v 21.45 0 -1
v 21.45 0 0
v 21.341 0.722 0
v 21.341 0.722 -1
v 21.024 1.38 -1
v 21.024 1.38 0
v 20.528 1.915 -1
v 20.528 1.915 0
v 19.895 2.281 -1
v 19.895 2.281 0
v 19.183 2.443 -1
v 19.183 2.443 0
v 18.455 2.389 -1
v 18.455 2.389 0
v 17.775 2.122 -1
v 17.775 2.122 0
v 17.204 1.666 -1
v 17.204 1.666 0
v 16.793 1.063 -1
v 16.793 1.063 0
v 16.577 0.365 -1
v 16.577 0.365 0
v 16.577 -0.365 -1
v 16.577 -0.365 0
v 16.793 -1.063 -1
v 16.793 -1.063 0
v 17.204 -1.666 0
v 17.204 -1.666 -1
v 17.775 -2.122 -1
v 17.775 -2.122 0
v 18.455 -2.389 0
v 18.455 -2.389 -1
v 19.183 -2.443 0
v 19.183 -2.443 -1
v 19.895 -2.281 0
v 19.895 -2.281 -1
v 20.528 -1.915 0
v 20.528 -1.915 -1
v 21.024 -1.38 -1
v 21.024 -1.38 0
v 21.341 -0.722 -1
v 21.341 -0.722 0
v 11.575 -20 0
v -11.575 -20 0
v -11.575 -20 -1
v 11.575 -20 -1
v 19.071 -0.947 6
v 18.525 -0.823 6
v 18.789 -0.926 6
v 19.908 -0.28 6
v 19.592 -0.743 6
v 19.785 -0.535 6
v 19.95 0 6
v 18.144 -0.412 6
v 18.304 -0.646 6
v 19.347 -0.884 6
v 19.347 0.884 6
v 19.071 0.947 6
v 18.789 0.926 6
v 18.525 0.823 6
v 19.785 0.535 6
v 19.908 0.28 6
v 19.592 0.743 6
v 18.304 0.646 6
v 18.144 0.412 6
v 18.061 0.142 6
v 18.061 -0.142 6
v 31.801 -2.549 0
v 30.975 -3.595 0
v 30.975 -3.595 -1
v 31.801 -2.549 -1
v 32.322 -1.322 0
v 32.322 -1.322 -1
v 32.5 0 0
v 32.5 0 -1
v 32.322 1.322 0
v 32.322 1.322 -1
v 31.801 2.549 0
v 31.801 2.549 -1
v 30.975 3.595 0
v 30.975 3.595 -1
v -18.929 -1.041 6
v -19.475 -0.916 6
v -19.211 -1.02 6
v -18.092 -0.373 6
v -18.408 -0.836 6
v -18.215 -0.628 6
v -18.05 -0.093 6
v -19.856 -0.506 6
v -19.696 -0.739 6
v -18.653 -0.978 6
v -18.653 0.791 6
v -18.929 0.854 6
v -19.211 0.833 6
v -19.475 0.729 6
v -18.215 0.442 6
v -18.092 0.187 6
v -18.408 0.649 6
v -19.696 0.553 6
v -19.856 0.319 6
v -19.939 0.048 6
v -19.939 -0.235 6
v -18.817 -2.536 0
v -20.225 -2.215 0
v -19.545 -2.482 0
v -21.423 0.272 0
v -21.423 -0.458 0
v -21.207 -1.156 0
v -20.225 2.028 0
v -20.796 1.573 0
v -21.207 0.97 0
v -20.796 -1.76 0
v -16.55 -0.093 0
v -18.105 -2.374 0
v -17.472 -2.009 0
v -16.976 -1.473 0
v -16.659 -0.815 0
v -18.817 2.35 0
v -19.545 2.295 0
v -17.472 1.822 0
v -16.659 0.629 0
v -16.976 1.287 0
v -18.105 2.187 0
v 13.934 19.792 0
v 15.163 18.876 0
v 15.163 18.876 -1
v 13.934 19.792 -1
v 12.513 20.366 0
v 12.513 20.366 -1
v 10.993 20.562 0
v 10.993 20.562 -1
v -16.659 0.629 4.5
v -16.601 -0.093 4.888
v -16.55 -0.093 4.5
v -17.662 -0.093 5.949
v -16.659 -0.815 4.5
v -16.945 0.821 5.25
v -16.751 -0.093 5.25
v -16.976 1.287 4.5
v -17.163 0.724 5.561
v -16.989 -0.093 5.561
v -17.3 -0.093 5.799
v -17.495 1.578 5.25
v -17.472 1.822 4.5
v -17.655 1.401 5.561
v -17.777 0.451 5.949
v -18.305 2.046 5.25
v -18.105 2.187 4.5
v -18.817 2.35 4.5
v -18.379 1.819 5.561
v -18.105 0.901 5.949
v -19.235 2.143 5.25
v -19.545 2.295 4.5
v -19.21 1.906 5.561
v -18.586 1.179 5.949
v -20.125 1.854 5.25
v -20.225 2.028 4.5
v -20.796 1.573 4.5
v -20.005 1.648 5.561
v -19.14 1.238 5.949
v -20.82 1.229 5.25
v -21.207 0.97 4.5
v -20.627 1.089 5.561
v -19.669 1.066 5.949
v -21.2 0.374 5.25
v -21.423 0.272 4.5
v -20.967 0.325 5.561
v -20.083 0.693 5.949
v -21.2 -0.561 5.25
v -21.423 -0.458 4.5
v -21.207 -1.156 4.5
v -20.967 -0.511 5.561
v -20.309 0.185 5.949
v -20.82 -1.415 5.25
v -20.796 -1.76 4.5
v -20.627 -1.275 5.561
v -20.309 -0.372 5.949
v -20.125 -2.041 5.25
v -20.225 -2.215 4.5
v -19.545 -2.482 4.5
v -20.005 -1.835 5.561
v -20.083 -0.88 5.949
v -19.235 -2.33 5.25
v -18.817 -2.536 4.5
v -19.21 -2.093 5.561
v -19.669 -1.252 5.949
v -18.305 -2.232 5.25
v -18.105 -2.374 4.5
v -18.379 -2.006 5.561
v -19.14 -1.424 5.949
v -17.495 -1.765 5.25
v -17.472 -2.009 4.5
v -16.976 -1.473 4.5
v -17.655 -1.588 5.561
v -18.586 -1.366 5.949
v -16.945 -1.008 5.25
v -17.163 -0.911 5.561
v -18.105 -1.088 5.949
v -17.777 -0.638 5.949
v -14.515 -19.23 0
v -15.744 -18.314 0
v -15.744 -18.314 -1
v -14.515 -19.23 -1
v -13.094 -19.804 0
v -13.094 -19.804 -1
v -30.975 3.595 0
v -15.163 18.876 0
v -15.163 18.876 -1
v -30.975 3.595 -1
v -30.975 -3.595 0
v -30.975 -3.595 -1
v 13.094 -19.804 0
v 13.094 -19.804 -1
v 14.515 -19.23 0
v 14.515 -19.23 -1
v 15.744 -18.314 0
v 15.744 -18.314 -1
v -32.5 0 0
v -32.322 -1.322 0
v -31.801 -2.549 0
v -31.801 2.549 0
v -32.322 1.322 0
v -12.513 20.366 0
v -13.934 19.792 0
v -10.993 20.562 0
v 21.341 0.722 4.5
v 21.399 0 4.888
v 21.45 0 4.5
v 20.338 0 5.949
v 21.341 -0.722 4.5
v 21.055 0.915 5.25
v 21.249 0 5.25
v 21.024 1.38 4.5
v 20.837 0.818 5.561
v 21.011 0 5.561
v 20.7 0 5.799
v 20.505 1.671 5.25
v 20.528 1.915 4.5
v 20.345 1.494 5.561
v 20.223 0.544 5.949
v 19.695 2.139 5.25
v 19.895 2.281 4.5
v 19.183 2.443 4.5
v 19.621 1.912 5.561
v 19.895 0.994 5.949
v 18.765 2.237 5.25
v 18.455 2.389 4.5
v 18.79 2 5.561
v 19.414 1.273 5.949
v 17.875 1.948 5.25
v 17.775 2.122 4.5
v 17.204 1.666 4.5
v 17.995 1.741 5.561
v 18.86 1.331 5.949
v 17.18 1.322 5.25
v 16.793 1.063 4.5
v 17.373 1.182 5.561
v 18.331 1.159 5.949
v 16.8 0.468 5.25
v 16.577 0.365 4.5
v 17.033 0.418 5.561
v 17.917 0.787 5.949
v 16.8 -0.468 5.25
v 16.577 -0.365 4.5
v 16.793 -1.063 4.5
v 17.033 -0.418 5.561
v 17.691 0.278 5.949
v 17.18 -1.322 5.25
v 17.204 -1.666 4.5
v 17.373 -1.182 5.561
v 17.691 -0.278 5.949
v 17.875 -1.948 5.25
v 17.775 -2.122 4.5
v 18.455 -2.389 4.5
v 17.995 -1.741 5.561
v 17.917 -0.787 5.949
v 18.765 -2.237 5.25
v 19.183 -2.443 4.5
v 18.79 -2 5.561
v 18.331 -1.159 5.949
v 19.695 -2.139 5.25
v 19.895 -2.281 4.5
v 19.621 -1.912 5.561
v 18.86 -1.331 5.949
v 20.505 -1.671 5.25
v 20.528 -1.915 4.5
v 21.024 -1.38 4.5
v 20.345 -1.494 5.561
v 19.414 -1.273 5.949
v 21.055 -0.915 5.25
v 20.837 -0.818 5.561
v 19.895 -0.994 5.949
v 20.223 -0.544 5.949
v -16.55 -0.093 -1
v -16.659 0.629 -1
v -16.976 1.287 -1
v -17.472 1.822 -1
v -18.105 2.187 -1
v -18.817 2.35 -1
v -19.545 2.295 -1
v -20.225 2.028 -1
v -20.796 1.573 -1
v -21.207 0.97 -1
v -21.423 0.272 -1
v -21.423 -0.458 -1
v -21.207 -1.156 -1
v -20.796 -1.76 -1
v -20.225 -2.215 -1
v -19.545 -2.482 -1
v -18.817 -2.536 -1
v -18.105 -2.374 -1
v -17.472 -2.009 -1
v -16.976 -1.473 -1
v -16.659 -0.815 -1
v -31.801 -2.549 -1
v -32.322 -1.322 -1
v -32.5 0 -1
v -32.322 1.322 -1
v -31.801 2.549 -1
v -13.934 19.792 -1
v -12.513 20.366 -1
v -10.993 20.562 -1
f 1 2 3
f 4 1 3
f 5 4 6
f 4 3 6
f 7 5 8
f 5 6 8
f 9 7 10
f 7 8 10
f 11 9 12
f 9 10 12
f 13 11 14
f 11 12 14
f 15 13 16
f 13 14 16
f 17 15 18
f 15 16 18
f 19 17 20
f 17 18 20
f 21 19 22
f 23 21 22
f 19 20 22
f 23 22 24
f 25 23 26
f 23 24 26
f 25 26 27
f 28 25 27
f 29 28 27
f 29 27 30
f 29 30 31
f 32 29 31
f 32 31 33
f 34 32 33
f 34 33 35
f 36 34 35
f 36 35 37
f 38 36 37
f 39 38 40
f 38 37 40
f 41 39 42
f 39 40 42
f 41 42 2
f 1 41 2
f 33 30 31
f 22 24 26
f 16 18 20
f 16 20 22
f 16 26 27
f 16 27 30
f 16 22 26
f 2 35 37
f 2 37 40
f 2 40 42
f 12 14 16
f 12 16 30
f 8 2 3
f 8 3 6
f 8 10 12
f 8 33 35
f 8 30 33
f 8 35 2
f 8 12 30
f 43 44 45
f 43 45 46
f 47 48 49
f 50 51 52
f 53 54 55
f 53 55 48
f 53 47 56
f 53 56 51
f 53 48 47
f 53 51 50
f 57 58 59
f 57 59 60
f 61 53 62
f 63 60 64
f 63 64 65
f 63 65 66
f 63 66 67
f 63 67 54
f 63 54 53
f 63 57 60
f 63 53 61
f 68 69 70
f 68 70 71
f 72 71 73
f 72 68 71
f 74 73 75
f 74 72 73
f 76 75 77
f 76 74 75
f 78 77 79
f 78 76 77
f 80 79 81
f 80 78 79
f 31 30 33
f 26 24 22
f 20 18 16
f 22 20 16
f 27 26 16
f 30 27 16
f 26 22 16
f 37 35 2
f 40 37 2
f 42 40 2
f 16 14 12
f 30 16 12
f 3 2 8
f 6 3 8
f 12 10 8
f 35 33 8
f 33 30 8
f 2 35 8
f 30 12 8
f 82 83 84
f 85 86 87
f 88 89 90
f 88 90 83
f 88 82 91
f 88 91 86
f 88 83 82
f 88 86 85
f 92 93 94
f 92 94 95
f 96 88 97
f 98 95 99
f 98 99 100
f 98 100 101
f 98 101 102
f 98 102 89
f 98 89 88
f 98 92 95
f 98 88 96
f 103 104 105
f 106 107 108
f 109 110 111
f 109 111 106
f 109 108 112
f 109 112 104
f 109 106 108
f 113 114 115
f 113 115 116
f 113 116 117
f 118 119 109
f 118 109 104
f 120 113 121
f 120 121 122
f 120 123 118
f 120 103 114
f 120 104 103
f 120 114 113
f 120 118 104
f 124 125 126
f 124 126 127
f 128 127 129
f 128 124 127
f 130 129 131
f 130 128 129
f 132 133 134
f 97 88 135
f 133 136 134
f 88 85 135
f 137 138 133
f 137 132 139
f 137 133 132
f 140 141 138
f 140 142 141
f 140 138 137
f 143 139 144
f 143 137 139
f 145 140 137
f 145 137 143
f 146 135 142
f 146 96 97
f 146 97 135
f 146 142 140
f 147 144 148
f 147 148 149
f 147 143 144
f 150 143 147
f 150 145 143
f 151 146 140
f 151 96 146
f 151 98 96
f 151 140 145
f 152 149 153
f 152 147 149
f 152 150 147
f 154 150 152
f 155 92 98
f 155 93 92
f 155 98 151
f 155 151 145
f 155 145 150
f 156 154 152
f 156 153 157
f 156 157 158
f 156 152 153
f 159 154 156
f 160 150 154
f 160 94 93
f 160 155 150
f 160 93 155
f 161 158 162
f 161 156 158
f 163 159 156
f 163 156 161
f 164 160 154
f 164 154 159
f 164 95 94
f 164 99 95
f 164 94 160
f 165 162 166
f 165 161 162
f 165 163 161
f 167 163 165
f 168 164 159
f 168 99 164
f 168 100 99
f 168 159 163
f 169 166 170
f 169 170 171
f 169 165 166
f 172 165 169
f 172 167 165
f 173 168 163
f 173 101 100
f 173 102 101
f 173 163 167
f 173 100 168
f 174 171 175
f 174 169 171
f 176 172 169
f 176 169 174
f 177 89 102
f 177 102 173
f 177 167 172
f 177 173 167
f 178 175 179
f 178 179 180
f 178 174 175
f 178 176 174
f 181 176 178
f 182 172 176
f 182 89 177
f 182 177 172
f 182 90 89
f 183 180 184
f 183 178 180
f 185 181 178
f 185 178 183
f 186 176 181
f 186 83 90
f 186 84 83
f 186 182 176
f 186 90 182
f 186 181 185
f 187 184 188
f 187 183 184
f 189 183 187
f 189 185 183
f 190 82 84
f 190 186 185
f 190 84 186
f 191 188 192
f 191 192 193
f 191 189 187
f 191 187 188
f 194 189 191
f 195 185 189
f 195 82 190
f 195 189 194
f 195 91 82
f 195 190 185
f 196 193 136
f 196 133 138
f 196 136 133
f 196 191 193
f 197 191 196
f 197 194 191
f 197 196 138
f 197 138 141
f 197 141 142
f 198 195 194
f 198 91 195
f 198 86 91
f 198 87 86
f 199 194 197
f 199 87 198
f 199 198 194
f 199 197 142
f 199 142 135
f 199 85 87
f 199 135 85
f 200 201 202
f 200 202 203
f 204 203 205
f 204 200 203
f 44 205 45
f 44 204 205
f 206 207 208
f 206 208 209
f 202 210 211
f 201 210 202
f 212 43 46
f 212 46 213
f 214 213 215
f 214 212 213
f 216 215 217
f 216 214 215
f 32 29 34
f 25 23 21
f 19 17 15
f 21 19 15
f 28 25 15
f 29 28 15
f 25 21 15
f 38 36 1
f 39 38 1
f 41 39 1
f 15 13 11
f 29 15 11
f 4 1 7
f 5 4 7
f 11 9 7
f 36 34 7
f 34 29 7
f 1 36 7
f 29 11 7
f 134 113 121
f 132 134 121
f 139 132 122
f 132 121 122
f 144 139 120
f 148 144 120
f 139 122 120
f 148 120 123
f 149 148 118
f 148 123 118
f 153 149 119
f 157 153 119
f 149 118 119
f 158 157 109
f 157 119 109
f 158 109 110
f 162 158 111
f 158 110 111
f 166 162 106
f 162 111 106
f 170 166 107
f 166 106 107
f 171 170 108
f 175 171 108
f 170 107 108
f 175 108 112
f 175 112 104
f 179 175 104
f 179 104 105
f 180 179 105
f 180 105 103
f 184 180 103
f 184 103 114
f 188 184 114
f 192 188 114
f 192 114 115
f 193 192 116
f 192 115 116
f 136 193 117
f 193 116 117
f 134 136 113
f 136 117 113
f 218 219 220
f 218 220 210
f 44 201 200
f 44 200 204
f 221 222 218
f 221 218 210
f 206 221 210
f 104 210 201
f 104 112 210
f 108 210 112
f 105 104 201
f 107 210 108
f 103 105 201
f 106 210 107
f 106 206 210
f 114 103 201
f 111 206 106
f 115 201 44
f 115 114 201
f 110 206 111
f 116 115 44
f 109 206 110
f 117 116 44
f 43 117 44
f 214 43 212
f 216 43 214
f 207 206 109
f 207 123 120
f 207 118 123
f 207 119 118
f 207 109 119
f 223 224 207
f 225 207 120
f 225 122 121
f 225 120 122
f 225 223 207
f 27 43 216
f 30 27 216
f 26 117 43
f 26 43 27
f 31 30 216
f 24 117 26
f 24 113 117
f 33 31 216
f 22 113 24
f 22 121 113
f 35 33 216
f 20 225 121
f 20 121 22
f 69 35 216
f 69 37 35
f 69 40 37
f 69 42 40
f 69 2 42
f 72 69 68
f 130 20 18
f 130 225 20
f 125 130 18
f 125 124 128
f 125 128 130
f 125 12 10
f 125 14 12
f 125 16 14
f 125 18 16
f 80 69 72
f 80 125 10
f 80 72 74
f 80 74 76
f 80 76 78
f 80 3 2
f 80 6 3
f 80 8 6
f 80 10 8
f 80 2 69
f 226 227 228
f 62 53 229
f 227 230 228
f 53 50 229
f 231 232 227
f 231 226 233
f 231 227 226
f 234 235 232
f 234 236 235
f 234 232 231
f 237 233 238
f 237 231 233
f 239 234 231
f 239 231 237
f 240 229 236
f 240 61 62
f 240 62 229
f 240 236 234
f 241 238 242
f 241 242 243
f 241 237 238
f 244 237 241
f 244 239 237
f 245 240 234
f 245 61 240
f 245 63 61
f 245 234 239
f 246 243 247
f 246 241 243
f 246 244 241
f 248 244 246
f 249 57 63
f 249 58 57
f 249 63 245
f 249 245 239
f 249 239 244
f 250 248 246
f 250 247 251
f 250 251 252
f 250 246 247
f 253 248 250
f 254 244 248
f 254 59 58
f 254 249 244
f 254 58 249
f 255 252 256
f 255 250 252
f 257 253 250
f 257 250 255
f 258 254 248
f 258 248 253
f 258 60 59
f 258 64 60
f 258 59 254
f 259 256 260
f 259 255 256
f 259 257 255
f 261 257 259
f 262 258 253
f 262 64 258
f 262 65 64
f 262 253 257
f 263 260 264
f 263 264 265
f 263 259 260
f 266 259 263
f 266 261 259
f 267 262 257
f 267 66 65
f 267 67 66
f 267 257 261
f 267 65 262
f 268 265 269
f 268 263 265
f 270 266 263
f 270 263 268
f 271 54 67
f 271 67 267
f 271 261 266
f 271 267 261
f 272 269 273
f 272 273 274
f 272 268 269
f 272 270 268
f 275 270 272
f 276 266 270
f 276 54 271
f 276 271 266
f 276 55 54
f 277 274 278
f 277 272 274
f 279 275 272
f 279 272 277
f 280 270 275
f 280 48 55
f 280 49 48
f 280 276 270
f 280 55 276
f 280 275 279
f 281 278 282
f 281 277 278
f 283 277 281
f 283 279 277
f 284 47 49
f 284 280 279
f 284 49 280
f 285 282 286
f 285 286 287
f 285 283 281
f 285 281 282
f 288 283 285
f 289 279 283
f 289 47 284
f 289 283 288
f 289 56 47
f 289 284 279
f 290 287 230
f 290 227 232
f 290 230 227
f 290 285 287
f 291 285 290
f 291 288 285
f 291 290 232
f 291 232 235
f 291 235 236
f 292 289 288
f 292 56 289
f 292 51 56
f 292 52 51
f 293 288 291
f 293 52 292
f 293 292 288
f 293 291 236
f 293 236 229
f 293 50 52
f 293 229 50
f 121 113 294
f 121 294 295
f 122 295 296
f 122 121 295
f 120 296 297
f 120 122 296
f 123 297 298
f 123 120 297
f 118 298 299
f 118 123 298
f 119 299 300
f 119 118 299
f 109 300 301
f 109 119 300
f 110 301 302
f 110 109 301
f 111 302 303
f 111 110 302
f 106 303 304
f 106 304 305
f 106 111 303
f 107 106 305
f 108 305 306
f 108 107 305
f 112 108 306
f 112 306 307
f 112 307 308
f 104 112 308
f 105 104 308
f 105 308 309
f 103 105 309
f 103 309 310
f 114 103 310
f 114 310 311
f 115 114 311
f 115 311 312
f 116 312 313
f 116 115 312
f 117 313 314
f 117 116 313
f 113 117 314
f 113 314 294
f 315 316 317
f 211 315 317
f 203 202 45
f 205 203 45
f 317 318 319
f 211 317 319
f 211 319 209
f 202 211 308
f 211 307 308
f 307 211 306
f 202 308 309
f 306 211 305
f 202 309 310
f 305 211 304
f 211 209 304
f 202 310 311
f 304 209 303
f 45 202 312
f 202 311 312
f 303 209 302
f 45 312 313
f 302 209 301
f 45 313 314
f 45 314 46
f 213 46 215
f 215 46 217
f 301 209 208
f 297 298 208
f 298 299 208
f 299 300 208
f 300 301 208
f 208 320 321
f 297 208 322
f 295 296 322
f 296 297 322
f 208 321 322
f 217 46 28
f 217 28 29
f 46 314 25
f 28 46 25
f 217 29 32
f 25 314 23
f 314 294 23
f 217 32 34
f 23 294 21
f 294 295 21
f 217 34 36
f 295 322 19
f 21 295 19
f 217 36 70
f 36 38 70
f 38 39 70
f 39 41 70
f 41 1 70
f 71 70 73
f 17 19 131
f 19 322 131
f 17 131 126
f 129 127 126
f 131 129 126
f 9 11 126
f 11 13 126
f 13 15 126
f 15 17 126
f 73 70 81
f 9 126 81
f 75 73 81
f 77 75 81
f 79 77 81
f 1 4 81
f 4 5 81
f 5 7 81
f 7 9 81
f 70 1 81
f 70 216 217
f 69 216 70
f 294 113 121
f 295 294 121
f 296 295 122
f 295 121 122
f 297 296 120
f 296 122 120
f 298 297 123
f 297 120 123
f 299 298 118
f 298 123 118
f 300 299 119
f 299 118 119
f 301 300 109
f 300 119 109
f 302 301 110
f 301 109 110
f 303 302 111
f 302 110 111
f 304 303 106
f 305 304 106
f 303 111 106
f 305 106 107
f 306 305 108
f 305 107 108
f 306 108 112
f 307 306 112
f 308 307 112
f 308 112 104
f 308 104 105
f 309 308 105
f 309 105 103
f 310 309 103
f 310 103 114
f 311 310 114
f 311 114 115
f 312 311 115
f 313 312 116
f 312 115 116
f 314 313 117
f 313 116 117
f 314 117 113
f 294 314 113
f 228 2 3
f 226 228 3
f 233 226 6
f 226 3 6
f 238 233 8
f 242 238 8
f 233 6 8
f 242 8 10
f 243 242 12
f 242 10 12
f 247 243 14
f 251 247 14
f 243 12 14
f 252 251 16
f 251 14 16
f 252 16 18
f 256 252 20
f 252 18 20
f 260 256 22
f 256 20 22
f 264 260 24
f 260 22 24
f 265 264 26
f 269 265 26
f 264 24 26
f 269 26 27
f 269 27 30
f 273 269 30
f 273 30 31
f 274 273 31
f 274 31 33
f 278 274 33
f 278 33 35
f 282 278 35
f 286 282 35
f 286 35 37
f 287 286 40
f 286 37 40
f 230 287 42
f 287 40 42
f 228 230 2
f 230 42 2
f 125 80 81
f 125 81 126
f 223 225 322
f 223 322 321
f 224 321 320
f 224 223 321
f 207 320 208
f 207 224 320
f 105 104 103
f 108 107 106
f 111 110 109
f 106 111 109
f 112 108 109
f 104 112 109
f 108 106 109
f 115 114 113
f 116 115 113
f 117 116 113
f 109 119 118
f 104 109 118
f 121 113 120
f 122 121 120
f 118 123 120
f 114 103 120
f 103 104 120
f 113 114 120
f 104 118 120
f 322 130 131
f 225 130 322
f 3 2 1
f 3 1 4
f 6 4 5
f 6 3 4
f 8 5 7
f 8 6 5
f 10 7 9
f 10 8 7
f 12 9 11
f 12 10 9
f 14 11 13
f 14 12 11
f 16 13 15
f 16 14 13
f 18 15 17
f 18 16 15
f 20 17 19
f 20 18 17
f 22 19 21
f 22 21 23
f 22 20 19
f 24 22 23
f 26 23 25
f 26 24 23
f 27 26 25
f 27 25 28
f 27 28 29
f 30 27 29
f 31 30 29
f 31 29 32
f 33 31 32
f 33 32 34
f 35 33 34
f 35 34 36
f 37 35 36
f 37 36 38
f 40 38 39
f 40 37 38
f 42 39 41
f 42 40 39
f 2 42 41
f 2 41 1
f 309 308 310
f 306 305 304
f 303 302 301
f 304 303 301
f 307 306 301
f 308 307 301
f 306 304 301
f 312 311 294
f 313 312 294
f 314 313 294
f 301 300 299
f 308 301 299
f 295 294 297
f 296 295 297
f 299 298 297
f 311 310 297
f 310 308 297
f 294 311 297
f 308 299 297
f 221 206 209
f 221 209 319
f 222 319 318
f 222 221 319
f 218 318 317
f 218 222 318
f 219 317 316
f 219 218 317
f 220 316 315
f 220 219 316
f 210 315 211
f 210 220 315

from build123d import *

# Parameters (mm, degrees)
F0_R     = 2.45
F1_DEPTH = 1
F2_DEPTH = 6
F3_R     = 1.5
F4_R     = 1.5
F5_DEPTH = 1


# Not quite as in the source:
# - a feature names something its author has since deleted; it is built from what else it names


with BuildPart() as f1:
    # F0 (on Top) → F1 (new body)
    with BuildSketch(Plane.XY):
        with BuildLine():
            Line((10.9931575138, 20.5618447948), (0, 20.5618447948))
            Line((0, 20.5618447948), (0, -20))
            Line((0, -20), (11.5745256156, -20))
            ThreePointArc((11.5745256156, -20), (13.8232148234, -19.5626789272), (15.7441043055, -18.3144656157))
            Line((15.7441043055, -18.3144656157), (30.9746489082, -3.5953880131))
            ThreePointArc((30.9746489082, -3.5953880131), (32.5, 0), (30.9746489082, 3.5953880131))
            Line((30.9746489082, 3.5953880131), (15.1627362037, 18.8763104104))
            ThreePointArc((15.1627362037, 18.8763104104), (13.2418467215, 20.124523722), (10.9931575138, 20.5618447948))
        make_face()
        with Locations((19, 0)):
            Circle(F0_R, mode=Mode.SUBTRACT)
        with BuildLine():
            Line((0, 20.5618447948), (-10.9931575138, 20.5618447948))
            ThreePointArc((-10.9931575138, 20.5618447948), (-13.2418467215, 20.124523722), (-15.1627362037, 18.8763104104))
            Line((-15.1627362037, 18.8763104104), (-30.9746489082, 3.5953880131))
            ThreePointArc((-30.9746489082, 3.5953880131), (-32.5, 0), (-30.9746489082, -3.5953880131))
            Line((-30.9746489082, -3.5953880131), (-15.7441043055, -18.3144656157))
            ThreePointArc((-15.7441043055, -18.3144656157), (-13.8232148234, -19.5626789272), (-11.5745256156, -20))
            Line((-11.5745256156, -20), (0, -20))
            Line((0, -20), (0, 20.5618447948))
        make_face()
        with Locations((-19, -0.0933343646)):
            Circle(F0_R, mode=Mode.SUBTRACT)
    extrude(amount=-F1_DEPTH)


with BuildPart() as f2:
    # F0 (on Top) → F2 (new body)
    with BuildSketch(Plane.XY):
        with Locations((-19, -0.0933343646)):
            Circle(F0_R)
    extrude(amount=F2_DEPTH)

    # F3
    f3_edges = [f2.edges().sort_by_distance(p)[0] for p in [
        (-21.45, -0.093334, 6),
    ]]
    fillet(f3_edges, radius=F3_R)


with BuildPart() as f2b:
    # F0 (on Top) → F2, piece 2 (new body)
    with BuildSketch(Plane.XY):
        with Locations((19, 0)):
            Circle(F0_R)
    extrude(amount=F2_DEPTH)

    # F4
    f4_edges = [f2b.edges().sort_by_distance(p)[0] for p in [
        (16.55, 0, 6),
    ]]
    fillet(f4_edges, radius=F4_R)


with BuildPart() as f5:
    # F5 (new): a face of the model
    f5_faces = [f2b.part.faces().sort_by_distance(p)[0] for p in [
        (19, 0, 0),
    ]]
    extrude(f5_faces, amount=F5_DEPTH)


with BuildPart() as f5b:
    # F5#2 (new): a face of the model
    f5_2_faces = [f2.part.faces().sort_by_distance(p)[0] for p in [
        (-19, -0.0933343646, 0),
    ]]
    extrude(f5_2_faces, amount=F5_DEPTH)


solid = Compound([f1.part, f2.part, f2b.part, f5.part, f5b.part])
